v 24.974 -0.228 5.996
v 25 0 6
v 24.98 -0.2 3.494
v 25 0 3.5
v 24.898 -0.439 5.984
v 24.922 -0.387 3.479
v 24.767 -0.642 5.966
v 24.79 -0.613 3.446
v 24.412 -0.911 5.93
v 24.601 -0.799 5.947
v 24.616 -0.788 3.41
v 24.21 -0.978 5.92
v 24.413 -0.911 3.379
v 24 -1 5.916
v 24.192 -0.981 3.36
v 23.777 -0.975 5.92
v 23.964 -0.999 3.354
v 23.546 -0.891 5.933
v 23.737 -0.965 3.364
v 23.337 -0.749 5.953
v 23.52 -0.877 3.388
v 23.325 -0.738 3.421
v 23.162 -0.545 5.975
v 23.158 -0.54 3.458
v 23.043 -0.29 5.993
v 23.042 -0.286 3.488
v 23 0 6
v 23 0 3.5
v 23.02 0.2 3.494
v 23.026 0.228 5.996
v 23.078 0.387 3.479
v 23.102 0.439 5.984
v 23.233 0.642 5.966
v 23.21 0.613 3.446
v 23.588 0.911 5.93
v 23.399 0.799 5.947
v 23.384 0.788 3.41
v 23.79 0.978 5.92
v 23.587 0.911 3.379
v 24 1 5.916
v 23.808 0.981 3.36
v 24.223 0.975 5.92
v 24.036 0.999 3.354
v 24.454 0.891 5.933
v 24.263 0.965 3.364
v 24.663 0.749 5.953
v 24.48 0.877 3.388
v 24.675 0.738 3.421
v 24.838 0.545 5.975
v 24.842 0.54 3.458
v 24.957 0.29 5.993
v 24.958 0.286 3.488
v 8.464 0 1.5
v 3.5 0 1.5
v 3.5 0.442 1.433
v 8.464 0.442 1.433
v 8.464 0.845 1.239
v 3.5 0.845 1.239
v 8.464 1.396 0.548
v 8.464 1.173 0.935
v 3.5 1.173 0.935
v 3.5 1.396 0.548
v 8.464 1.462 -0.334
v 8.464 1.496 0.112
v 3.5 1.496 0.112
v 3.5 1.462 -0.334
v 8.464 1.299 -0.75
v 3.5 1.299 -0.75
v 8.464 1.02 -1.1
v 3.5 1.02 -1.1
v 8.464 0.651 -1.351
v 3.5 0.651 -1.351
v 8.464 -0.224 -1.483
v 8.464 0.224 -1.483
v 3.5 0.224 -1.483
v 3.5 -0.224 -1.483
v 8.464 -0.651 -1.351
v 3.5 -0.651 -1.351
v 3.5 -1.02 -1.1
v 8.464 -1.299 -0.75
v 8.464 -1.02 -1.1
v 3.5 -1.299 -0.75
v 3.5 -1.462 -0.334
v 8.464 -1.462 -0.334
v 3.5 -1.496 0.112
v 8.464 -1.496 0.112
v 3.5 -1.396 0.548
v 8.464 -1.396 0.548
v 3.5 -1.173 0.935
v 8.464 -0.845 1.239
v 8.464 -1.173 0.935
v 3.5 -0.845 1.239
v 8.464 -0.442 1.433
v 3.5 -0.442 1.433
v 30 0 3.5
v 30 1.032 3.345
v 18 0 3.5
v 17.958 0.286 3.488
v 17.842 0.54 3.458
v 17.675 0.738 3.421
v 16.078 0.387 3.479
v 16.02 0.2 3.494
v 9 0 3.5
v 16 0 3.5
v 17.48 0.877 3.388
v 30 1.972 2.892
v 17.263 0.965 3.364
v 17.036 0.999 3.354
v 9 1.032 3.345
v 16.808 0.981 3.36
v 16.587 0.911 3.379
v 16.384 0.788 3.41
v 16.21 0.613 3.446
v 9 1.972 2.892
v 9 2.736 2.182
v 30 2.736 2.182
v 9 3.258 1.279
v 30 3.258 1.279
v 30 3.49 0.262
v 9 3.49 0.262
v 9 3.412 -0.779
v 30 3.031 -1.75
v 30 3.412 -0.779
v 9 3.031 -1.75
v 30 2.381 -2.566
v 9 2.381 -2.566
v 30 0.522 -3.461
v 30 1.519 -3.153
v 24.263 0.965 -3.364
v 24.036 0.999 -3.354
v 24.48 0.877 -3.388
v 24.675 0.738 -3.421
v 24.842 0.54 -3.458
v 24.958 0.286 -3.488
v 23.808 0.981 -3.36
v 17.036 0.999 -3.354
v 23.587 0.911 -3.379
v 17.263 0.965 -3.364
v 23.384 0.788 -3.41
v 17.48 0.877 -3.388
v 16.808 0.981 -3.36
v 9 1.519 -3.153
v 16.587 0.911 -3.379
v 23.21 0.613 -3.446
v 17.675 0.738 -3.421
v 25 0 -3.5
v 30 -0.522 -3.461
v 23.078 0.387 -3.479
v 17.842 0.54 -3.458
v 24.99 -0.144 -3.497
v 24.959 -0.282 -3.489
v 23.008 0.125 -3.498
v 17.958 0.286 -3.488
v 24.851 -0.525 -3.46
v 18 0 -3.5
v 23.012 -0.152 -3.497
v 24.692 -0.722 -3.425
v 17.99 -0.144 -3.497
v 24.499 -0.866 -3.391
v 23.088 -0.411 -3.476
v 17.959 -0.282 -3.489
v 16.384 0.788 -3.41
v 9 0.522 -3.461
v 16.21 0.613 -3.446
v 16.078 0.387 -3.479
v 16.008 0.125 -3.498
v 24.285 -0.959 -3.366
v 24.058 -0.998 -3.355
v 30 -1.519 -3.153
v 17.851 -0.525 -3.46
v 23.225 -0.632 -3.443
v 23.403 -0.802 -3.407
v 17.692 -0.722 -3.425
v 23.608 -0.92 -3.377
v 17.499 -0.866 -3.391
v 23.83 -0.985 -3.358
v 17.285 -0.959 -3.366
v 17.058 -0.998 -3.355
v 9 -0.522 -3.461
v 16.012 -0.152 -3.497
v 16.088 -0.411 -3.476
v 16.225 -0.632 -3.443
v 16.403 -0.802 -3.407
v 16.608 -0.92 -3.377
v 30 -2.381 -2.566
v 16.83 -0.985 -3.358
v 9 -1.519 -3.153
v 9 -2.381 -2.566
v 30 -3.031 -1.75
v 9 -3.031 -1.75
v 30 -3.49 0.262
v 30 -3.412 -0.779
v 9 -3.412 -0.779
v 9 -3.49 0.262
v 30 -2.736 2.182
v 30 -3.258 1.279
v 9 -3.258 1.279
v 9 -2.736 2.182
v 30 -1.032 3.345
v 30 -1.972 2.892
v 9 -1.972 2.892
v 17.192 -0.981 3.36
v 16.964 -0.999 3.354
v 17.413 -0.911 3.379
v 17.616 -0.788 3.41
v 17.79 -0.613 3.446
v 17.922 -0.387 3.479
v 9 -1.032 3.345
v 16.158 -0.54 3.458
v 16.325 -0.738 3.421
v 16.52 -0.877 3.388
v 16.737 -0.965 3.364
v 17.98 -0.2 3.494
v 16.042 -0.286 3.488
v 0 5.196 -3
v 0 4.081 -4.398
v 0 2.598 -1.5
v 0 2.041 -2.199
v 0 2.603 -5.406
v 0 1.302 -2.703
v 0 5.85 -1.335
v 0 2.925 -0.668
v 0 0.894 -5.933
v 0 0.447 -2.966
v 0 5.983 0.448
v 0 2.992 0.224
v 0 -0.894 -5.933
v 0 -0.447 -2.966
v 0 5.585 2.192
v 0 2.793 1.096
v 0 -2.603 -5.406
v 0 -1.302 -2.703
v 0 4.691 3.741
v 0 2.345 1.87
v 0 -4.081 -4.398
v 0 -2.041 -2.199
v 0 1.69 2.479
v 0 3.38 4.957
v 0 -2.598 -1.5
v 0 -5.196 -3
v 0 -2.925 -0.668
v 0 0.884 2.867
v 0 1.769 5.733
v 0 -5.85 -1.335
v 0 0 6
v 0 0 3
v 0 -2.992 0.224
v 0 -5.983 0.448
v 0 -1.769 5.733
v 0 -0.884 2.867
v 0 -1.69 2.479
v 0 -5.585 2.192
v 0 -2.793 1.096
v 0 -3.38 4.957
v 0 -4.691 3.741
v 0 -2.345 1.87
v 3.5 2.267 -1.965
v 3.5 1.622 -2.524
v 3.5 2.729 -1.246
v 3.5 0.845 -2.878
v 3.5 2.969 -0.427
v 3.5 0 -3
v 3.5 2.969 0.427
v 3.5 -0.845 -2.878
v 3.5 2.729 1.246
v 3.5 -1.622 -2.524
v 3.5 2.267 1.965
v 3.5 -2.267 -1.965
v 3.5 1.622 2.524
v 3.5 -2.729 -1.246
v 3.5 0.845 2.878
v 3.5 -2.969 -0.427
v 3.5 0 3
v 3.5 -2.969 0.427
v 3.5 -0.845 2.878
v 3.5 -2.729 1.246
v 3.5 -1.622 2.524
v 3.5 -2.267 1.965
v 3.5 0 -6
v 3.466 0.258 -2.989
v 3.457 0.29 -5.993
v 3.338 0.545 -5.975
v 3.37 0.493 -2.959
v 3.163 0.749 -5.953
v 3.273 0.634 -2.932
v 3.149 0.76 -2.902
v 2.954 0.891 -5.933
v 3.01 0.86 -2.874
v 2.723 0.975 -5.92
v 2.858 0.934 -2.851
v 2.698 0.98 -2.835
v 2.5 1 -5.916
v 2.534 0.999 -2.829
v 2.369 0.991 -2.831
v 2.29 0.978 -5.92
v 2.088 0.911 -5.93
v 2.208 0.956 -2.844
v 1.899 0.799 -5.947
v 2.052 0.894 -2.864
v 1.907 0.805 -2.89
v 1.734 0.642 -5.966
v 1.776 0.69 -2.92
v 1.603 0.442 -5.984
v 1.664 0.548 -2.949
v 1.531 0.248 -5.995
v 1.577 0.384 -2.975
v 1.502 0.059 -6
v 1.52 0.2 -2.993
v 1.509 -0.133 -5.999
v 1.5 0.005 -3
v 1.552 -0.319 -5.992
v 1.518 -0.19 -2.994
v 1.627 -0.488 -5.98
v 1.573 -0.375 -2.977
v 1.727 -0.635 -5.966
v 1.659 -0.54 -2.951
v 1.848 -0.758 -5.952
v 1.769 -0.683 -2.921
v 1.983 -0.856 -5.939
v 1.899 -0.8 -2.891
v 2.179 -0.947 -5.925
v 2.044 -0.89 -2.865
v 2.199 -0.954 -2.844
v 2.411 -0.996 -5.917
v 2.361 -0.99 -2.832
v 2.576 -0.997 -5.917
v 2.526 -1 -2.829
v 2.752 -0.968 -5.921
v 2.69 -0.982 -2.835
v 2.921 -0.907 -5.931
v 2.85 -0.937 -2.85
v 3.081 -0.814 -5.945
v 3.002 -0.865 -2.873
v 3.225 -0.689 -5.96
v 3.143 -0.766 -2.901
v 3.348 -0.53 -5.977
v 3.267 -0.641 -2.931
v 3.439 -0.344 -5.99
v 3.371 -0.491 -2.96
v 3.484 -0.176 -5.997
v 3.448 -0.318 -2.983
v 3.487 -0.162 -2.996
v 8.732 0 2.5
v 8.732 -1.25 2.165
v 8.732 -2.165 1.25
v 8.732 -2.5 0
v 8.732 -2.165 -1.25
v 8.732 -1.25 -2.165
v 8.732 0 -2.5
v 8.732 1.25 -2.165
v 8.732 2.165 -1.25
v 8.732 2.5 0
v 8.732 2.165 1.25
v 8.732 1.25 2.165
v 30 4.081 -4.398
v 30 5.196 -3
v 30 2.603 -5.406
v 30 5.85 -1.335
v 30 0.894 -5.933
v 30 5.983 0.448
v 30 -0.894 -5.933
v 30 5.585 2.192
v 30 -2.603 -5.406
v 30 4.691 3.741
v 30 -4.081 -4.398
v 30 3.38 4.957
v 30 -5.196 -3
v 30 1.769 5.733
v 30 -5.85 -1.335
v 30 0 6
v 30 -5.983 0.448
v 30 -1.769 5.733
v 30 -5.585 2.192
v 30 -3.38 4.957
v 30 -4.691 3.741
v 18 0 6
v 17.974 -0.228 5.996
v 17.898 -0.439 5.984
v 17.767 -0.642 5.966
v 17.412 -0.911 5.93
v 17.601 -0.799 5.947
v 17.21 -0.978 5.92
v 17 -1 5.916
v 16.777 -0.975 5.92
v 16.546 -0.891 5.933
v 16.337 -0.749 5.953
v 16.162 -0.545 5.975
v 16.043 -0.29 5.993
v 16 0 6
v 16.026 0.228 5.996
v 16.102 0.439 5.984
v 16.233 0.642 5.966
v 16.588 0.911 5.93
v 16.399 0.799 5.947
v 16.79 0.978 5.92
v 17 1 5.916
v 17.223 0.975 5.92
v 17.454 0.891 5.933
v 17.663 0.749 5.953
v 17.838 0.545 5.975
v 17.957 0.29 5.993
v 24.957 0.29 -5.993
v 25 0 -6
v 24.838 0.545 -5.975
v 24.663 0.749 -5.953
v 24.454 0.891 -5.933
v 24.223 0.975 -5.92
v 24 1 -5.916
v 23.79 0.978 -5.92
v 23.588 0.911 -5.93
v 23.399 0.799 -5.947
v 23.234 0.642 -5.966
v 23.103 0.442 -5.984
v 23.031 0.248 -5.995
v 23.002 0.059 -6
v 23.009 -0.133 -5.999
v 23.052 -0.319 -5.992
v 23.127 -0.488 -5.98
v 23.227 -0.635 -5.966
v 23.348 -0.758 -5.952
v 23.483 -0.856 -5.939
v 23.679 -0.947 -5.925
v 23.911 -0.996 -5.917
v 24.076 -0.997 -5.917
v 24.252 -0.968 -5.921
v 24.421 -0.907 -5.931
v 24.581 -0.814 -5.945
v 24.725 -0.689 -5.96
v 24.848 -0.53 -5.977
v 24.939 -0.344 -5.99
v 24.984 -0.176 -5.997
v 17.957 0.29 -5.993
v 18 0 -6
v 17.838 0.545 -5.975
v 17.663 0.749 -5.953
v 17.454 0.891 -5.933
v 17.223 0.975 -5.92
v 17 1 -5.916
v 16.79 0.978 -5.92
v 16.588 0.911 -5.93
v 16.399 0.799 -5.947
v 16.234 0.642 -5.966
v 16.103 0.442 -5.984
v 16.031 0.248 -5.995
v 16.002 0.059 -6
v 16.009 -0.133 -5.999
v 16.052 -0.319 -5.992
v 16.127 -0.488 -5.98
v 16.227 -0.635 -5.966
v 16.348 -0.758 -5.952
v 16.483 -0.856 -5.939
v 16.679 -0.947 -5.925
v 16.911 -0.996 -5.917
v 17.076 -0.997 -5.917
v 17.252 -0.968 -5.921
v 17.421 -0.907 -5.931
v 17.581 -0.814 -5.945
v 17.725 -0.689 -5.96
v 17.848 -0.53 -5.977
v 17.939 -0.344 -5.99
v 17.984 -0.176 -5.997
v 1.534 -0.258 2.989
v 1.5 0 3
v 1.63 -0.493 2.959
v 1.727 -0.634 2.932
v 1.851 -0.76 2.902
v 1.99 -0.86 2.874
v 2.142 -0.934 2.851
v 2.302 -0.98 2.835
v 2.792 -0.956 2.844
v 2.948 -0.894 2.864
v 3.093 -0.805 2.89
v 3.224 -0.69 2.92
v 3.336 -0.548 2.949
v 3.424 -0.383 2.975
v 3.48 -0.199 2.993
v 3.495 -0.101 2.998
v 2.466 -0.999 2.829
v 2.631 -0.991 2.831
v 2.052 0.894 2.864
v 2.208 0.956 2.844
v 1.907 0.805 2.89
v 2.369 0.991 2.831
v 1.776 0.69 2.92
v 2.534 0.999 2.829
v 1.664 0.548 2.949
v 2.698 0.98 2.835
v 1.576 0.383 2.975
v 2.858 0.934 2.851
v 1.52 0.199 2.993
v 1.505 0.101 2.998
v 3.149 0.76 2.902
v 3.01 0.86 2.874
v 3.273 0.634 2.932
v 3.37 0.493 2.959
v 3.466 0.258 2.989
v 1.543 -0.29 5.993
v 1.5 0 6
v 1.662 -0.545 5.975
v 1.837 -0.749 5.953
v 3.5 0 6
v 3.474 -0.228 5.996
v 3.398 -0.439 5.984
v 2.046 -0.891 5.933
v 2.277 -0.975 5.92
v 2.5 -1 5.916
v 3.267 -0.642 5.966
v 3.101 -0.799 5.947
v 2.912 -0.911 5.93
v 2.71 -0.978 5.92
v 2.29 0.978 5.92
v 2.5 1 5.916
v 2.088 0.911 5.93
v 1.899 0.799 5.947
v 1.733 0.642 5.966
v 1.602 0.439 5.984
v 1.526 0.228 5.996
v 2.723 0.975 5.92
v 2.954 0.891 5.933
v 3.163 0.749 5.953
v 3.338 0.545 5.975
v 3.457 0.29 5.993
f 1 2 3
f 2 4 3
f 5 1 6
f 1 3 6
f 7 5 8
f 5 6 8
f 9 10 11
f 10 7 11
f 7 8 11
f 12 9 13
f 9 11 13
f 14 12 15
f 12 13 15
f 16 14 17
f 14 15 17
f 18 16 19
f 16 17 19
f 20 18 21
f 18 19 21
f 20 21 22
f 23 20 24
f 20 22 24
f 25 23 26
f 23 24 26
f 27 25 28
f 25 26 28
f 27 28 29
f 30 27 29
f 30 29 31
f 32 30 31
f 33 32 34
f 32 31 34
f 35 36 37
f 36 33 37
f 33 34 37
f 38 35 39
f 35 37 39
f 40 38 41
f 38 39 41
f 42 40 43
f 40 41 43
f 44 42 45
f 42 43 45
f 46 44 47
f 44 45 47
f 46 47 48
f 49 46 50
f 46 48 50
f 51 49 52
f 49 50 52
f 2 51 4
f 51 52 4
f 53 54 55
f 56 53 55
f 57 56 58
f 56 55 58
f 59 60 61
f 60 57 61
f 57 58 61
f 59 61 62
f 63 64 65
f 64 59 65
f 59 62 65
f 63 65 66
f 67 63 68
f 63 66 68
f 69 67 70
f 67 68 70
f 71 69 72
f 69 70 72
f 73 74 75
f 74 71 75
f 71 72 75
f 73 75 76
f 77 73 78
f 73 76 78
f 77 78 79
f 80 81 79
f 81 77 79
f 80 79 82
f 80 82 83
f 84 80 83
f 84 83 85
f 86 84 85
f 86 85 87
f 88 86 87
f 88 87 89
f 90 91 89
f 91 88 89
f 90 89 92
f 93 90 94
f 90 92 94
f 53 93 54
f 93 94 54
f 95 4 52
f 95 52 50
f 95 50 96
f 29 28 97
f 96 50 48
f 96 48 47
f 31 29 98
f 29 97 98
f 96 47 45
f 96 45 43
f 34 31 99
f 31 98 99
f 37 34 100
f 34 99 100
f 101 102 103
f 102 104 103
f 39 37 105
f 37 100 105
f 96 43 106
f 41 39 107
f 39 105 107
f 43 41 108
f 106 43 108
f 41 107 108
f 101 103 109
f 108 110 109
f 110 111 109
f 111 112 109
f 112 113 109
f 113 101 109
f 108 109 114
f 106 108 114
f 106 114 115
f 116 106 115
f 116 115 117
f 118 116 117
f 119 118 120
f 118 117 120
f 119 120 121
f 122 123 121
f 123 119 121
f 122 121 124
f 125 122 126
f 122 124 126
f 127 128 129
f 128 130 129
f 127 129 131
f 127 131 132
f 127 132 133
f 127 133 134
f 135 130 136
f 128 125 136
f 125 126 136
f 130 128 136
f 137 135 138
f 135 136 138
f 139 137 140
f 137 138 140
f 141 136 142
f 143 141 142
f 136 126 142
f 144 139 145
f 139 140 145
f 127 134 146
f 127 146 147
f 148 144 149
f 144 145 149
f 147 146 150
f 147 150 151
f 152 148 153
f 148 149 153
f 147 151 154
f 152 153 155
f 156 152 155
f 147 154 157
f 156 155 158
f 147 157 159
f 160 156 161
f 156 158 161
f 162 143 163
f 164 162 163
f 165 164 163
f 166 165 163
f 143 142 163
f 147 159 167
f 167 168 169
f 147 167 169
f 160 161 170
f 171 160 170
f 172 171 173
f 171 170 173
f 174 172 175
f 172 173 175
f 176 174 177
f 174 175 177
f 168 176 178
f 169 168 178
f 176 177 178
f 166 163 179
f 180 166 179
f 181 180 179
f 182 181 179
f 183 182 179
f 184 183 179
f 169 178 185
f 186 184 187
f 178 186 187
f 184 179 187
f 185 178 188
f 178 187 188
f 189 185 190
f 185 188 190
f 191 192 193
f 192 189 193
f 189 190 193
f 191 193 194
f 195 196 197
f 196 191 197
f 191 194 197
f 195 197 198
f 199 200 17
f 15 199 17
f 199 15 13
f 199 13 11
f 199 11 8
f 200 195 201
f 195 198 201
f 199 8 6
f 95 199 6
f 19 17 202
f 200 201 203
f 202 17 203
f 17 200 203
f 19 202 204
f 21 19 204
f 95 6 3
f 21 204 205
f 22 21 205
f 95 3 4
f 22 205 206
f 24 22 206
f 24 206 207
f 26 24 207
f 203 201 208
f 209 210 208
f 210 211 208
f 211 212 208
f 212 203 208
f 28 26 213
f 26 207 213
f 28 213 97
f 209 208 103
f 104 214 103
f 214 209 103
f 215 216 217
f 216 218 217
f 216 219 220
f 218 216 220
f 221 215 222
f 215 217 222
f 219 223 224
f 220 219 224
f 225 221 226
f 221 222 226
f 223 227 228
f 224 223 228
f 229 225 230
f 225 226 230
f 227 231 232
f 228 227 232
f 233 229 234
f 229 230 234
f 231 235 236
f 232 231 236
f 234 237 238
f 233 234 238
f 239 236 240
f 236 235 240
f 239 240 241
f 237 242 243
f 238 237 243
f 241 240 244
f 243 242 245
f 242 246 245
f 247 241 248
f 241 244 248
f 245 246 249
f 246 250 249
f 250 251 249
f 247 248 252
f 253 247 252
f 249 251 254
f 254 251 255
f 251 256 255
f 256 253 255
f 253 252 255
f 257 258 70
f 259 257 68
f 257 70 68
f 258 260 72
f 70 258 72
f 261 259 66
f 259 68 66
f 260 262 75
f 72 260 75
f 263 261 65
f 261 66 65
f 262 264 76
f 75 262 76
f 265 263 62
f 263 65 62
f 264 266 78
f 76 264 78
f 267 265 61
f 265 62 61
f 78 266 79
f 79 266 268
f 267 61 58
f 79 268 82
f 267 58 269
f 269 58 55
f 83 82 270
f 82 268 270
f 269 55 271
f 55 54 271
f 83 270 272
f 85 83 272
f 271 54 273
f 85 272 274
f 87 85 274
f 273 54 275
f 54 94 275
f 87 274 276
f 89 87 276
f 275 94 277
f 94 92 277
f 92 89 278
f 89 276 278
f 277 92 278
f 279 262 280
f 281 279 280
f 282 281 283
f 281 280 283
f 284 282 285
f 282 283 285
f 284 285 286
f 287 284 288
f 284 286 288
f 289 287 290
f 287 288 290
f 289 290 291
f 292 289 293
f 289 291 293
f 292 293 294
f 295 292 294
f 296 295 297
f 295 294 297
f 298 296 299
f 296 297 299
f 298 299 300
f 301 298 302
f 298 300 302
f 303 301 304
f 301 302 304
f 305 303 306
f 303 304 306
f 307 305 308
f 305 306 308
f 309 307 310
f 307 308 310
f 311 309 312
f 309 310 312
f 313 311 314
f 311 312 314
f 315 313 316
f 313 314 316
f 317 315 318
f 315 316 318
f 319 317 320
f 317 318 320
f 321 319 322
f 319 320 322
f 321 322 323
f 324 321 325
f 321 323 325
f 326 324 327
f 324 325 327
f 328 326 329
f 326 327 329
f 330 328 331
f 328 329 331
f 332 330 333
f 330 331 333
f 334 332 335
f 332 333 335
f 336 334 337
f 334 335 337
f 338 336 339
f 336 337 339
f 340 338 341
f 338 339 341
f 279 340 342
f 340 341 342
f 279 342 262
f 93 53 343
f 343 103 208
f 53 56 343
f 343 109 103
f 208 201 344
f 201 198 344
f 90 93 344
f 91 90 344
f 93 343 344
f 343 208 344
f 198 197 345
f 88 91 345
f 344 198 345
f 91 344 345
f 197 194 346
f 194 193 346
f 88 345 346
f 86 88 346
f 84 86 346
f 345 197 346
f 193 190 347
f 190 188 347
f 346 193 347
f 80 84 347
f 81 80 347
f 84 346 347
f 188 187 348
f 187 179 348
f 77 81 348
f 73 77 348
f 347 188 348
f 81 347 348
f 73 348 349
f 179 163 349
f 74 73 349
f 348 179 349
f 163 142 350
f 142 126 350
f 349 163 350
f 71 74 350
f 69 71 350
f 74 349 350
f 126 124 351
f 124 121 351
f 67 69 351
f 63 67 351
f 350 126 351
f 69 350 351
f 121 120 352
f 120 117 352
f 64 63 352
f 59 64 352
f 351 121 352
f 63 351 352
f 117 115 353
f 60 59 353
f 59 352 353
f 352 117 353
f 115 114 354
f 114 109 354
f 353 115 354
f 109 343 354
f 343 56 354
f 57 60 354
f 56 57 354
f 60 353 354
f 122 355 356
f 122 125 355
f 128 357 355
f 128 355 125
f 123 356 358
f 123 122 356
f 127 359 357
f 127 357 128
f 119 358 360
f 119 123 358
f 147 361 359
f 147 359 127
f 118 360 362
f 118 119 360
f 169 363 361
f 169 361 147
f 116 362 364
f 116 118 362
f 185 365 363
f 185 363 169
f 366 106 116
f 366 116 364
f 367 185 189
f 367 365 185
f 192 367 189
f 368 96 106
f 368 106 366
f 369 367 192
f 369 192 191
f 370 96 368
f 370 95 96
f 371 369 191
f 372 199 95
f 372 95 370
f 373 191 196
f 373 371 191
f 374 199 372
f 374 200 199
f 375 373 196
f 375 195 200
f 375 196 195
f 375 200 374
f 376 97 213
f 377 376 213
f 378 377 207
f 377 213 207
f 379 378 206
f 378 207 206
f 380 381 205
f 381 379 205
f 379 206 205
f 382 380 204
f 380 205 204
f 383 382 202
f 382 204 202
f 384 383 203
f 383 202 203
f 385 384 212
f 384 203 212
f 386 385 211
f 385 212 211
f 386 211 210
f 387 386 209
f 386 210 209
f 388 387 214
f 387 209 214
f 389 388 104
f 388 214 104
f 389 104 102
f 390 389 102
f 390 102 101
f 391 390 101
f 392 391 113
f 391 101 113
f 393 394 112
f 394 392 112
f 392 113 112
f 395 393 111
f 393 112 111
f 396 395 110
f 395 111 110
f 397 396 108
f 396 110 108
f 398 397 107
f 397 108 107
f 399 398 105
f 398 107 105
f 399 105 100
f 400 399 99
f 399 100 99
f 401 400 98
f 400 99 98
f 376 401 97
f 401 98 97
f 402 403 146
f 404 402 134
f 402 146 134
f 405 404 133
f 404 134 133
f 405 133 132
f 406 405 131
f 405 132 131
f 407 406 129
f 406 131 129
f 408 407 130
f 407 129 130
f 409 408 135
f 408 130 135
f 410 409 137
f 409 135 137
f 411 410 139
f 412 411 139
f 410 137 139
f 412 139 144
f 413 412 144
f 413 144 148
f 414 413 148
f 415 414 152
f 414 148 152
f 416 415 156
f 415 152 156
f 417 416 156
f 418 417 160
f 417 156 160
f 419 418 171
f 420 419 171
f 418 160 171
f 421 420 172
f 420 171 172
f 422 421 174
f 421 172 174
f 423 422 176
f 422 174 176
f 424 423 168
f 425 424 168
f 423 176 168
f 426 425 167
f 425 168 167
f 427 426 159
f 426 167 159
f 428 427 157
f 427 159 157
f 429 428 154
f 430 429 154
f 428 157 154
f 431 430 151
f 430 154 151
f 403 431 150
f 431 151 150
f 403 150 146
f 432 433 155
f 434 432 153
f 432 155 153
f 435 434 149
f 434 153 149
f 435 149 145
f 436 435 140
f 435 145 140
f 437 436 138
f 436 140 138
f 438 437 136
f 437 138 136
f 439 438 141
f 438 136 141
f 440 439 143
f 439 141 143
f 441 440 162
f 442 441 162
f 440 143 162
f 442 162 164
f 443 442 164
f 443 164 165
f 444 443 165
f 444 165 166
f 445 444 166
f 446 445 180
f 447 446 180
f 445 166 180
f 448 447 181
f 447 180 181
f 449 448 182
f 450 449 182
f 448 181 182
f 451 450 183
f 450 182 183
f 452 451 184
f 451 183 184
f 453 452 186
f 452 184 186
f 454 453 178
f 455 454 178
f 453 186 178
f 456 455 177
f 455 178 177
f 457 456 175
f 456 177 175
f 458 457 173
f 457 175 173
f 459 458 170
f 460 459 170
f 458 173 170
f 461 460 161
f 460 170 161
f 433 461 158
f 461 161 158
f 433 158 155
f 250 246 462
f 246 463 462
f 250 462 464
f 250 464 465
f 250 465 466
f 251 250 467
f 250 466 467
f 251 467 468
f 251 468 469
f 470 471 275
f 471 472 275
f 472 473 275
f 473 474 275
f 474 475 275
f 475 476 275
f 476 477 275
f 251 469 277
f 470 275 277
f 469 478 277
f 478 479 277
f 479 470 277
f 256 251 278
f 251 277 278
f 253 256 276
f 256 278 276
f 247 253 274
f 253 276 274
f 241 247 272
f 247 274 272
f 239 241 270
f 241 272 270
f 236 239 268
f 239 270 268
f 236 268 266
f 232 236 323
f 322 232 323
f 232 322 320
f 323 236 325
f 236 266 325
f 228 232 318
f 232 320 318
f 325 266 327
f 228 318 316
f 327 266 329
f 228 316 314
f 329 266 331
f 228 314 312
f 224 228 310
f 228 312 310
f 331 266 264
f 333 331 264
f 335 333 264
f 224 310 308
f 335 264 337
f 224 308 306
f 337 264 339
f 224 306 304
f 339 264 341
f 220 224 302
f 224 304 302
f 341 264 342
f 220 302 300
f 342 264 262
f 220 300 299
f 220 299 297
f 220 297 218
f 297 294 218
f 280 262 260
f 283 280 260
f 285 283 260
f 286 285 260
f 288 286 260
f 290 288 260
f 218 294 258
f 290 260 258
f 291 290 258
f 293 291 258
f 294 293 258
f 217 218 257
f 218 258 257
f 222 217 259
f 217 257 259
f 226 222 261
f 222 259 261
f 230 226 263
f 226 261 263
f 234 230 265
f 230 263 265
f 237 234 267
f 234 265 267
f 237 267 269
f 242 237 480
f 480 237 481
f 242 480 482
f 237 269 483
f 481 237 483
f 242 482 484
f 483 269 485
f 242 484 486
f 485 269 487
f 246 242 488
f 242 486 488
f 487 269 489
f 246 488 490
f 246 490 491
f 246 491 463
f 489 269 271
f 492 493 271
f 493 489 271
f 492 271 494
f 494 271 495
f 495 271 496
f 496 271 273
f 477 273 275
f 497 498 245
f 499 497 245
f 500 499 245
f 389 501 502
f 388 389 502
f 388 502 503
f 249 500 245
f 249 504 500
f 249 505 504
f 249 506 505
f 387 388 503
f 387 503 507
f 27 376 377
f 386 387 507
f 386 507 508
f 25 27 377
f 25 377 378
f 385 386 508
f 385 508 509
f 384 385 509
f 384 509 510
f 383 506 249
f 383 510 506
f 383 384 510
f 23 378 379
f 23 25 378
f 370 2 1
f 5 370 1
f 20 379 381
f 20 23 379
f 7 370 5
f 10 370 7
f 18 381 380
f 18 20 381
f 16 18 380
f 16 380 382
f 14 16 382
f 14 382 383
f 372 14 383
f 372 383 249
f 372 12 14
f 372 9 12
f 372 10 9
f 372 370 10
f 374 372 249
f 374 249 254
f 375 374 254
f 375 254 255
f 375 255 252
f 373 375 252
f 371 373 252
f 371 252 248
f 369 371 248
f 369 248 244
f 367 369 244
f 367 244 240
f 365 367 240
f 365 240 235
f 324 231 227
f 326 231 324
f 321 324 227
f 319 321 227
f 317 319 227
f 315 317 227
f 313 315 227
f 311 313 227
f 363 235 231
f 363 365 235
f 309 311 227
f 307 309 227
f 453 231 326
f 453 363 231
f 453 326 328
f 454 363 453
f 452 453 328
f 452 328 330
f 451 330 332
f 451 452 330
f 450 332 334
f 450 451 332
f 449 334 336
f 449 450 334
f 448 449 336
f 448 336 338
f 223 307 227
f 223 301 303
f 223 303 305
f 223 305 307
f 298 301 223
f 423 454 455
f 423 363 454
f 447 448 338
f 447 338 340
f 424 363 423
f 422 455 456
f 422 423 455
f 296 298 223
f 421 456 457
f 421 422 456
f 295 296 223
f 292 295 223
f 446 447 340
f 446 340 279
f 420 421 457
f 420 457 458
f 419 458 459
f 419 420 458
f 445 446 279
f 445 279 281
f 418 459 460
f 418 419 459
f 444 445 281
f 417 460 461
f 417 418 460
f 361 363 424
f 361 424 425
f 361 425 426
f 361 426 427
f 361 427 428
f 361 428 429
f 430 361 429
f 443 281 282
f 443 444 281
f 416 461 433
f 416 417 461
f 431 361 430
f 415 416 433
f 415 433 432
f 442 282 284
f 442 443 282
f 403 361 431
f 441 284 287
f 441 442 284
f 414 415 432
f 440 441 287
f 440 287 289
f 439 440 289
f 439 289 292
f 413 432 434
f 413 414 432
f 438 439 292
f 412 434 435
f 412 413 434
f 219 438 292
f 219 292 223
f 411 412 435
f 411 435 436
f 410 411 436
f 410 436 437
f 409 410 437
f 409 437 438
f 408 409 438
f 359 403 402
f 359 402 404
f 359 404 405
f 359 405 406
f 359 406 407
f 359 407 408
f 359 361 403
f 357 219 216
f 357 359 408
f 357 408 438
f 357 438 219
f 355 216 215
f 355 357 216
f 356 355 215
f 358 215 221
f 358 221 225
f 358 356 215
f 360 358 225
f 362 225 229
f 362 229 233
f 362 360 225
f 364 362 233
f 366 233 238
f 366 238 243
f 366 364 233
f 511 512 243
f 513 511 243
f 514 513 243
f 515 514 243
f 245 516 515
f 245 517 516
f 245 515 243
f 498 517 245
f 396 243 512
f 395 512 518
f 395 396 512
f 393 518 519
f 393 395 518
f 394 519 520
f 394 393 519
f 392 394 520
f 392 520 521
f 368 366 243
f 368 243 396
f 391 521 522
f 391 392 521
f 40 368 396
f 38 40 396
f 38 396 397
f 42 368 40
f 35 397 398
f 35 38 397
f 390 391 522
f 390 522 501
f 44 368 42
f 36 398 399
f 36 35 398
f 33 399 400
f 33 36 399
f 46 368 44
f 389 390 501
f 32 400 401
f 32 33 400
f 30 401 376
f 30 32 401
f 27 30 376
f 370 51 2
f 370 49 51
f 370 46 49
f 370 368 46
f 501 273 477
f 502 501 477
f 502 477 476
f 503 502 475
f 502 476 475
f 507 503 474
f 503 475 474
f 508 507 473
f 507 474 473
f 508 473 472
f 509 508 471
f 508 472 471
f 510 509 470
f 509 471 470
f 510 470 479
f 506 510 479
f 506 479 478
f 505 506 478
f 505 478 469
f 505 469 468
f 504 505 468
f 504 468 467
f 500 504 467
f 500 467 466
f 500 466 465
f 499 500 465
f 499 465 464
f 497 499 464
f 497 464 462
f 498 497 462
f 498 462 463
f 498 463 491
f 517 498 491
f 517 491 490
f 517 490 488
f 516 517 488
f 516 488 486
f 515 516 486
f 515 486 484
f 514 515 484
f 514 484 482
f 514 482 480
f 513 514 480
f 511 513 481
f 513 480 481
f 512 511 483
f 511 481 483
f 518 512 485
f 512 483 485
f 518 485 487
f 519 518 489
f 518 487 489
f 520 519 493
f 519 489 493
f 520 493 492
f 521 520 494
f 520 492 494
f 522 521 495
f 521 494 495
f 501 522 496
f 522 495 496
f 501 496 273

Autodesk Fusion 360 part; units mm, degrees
sketch "Boceto1" plane through (0, 0, 0) normal (0, 1, 0) x (1, 0, 0)
  line L0 (0, -3) -> (0, -6)
  line L1 (0, -6) -> (30, -6)
  line L2 (30, -6) -> (30, -3.5)
  line L3 (30, -3.5) -> (9, -3.5)
  line L4 (9, -3.5) -> (8.4641, -1.5)
  line L5 (8.4641, -1.5) -> (3.5, -1.5)
  line L6 (3.5, -1.5) -> (3.5, -3)
  line L7 (0, -3) -> (3.5, -3)
  line L8 (0, 0) -> (32.7199, 0) construction
  dimension "d2" = 21
  dimension "d3" = 3.5
  dimension "d4" = 30
  dimension "d8" = 3
  dimension "d9" = 1.5
  dimension "d10" = 6
  dimension "d11" = 3.5
  dimension "d13" = 75
revolve "Revolución1" add sketch "Boceto1" angle 360 about axis through (0, 0, 0) along (1, 0, 0)
sketch "Boceto2" plane through (0, 0, 0) normal (0, 0, 1) x (1, 0, 0)
  circle A0 centre (24, 0) radius 1
  circle A1 centre (17, 0) radius 1
  circle A2 centre (2.5, 0) radius 1
  point P0 (30, 0)
  dimension "d15" = 2.5
  dimension "d16" = 2
  dimension "d17" = 2
  dimension "d18" = 2
  dimension "d19" = 6
  dimension "d20" = 13
extrude "Extruir1" cut sketch "Boceto2" along normal mid plane 14
